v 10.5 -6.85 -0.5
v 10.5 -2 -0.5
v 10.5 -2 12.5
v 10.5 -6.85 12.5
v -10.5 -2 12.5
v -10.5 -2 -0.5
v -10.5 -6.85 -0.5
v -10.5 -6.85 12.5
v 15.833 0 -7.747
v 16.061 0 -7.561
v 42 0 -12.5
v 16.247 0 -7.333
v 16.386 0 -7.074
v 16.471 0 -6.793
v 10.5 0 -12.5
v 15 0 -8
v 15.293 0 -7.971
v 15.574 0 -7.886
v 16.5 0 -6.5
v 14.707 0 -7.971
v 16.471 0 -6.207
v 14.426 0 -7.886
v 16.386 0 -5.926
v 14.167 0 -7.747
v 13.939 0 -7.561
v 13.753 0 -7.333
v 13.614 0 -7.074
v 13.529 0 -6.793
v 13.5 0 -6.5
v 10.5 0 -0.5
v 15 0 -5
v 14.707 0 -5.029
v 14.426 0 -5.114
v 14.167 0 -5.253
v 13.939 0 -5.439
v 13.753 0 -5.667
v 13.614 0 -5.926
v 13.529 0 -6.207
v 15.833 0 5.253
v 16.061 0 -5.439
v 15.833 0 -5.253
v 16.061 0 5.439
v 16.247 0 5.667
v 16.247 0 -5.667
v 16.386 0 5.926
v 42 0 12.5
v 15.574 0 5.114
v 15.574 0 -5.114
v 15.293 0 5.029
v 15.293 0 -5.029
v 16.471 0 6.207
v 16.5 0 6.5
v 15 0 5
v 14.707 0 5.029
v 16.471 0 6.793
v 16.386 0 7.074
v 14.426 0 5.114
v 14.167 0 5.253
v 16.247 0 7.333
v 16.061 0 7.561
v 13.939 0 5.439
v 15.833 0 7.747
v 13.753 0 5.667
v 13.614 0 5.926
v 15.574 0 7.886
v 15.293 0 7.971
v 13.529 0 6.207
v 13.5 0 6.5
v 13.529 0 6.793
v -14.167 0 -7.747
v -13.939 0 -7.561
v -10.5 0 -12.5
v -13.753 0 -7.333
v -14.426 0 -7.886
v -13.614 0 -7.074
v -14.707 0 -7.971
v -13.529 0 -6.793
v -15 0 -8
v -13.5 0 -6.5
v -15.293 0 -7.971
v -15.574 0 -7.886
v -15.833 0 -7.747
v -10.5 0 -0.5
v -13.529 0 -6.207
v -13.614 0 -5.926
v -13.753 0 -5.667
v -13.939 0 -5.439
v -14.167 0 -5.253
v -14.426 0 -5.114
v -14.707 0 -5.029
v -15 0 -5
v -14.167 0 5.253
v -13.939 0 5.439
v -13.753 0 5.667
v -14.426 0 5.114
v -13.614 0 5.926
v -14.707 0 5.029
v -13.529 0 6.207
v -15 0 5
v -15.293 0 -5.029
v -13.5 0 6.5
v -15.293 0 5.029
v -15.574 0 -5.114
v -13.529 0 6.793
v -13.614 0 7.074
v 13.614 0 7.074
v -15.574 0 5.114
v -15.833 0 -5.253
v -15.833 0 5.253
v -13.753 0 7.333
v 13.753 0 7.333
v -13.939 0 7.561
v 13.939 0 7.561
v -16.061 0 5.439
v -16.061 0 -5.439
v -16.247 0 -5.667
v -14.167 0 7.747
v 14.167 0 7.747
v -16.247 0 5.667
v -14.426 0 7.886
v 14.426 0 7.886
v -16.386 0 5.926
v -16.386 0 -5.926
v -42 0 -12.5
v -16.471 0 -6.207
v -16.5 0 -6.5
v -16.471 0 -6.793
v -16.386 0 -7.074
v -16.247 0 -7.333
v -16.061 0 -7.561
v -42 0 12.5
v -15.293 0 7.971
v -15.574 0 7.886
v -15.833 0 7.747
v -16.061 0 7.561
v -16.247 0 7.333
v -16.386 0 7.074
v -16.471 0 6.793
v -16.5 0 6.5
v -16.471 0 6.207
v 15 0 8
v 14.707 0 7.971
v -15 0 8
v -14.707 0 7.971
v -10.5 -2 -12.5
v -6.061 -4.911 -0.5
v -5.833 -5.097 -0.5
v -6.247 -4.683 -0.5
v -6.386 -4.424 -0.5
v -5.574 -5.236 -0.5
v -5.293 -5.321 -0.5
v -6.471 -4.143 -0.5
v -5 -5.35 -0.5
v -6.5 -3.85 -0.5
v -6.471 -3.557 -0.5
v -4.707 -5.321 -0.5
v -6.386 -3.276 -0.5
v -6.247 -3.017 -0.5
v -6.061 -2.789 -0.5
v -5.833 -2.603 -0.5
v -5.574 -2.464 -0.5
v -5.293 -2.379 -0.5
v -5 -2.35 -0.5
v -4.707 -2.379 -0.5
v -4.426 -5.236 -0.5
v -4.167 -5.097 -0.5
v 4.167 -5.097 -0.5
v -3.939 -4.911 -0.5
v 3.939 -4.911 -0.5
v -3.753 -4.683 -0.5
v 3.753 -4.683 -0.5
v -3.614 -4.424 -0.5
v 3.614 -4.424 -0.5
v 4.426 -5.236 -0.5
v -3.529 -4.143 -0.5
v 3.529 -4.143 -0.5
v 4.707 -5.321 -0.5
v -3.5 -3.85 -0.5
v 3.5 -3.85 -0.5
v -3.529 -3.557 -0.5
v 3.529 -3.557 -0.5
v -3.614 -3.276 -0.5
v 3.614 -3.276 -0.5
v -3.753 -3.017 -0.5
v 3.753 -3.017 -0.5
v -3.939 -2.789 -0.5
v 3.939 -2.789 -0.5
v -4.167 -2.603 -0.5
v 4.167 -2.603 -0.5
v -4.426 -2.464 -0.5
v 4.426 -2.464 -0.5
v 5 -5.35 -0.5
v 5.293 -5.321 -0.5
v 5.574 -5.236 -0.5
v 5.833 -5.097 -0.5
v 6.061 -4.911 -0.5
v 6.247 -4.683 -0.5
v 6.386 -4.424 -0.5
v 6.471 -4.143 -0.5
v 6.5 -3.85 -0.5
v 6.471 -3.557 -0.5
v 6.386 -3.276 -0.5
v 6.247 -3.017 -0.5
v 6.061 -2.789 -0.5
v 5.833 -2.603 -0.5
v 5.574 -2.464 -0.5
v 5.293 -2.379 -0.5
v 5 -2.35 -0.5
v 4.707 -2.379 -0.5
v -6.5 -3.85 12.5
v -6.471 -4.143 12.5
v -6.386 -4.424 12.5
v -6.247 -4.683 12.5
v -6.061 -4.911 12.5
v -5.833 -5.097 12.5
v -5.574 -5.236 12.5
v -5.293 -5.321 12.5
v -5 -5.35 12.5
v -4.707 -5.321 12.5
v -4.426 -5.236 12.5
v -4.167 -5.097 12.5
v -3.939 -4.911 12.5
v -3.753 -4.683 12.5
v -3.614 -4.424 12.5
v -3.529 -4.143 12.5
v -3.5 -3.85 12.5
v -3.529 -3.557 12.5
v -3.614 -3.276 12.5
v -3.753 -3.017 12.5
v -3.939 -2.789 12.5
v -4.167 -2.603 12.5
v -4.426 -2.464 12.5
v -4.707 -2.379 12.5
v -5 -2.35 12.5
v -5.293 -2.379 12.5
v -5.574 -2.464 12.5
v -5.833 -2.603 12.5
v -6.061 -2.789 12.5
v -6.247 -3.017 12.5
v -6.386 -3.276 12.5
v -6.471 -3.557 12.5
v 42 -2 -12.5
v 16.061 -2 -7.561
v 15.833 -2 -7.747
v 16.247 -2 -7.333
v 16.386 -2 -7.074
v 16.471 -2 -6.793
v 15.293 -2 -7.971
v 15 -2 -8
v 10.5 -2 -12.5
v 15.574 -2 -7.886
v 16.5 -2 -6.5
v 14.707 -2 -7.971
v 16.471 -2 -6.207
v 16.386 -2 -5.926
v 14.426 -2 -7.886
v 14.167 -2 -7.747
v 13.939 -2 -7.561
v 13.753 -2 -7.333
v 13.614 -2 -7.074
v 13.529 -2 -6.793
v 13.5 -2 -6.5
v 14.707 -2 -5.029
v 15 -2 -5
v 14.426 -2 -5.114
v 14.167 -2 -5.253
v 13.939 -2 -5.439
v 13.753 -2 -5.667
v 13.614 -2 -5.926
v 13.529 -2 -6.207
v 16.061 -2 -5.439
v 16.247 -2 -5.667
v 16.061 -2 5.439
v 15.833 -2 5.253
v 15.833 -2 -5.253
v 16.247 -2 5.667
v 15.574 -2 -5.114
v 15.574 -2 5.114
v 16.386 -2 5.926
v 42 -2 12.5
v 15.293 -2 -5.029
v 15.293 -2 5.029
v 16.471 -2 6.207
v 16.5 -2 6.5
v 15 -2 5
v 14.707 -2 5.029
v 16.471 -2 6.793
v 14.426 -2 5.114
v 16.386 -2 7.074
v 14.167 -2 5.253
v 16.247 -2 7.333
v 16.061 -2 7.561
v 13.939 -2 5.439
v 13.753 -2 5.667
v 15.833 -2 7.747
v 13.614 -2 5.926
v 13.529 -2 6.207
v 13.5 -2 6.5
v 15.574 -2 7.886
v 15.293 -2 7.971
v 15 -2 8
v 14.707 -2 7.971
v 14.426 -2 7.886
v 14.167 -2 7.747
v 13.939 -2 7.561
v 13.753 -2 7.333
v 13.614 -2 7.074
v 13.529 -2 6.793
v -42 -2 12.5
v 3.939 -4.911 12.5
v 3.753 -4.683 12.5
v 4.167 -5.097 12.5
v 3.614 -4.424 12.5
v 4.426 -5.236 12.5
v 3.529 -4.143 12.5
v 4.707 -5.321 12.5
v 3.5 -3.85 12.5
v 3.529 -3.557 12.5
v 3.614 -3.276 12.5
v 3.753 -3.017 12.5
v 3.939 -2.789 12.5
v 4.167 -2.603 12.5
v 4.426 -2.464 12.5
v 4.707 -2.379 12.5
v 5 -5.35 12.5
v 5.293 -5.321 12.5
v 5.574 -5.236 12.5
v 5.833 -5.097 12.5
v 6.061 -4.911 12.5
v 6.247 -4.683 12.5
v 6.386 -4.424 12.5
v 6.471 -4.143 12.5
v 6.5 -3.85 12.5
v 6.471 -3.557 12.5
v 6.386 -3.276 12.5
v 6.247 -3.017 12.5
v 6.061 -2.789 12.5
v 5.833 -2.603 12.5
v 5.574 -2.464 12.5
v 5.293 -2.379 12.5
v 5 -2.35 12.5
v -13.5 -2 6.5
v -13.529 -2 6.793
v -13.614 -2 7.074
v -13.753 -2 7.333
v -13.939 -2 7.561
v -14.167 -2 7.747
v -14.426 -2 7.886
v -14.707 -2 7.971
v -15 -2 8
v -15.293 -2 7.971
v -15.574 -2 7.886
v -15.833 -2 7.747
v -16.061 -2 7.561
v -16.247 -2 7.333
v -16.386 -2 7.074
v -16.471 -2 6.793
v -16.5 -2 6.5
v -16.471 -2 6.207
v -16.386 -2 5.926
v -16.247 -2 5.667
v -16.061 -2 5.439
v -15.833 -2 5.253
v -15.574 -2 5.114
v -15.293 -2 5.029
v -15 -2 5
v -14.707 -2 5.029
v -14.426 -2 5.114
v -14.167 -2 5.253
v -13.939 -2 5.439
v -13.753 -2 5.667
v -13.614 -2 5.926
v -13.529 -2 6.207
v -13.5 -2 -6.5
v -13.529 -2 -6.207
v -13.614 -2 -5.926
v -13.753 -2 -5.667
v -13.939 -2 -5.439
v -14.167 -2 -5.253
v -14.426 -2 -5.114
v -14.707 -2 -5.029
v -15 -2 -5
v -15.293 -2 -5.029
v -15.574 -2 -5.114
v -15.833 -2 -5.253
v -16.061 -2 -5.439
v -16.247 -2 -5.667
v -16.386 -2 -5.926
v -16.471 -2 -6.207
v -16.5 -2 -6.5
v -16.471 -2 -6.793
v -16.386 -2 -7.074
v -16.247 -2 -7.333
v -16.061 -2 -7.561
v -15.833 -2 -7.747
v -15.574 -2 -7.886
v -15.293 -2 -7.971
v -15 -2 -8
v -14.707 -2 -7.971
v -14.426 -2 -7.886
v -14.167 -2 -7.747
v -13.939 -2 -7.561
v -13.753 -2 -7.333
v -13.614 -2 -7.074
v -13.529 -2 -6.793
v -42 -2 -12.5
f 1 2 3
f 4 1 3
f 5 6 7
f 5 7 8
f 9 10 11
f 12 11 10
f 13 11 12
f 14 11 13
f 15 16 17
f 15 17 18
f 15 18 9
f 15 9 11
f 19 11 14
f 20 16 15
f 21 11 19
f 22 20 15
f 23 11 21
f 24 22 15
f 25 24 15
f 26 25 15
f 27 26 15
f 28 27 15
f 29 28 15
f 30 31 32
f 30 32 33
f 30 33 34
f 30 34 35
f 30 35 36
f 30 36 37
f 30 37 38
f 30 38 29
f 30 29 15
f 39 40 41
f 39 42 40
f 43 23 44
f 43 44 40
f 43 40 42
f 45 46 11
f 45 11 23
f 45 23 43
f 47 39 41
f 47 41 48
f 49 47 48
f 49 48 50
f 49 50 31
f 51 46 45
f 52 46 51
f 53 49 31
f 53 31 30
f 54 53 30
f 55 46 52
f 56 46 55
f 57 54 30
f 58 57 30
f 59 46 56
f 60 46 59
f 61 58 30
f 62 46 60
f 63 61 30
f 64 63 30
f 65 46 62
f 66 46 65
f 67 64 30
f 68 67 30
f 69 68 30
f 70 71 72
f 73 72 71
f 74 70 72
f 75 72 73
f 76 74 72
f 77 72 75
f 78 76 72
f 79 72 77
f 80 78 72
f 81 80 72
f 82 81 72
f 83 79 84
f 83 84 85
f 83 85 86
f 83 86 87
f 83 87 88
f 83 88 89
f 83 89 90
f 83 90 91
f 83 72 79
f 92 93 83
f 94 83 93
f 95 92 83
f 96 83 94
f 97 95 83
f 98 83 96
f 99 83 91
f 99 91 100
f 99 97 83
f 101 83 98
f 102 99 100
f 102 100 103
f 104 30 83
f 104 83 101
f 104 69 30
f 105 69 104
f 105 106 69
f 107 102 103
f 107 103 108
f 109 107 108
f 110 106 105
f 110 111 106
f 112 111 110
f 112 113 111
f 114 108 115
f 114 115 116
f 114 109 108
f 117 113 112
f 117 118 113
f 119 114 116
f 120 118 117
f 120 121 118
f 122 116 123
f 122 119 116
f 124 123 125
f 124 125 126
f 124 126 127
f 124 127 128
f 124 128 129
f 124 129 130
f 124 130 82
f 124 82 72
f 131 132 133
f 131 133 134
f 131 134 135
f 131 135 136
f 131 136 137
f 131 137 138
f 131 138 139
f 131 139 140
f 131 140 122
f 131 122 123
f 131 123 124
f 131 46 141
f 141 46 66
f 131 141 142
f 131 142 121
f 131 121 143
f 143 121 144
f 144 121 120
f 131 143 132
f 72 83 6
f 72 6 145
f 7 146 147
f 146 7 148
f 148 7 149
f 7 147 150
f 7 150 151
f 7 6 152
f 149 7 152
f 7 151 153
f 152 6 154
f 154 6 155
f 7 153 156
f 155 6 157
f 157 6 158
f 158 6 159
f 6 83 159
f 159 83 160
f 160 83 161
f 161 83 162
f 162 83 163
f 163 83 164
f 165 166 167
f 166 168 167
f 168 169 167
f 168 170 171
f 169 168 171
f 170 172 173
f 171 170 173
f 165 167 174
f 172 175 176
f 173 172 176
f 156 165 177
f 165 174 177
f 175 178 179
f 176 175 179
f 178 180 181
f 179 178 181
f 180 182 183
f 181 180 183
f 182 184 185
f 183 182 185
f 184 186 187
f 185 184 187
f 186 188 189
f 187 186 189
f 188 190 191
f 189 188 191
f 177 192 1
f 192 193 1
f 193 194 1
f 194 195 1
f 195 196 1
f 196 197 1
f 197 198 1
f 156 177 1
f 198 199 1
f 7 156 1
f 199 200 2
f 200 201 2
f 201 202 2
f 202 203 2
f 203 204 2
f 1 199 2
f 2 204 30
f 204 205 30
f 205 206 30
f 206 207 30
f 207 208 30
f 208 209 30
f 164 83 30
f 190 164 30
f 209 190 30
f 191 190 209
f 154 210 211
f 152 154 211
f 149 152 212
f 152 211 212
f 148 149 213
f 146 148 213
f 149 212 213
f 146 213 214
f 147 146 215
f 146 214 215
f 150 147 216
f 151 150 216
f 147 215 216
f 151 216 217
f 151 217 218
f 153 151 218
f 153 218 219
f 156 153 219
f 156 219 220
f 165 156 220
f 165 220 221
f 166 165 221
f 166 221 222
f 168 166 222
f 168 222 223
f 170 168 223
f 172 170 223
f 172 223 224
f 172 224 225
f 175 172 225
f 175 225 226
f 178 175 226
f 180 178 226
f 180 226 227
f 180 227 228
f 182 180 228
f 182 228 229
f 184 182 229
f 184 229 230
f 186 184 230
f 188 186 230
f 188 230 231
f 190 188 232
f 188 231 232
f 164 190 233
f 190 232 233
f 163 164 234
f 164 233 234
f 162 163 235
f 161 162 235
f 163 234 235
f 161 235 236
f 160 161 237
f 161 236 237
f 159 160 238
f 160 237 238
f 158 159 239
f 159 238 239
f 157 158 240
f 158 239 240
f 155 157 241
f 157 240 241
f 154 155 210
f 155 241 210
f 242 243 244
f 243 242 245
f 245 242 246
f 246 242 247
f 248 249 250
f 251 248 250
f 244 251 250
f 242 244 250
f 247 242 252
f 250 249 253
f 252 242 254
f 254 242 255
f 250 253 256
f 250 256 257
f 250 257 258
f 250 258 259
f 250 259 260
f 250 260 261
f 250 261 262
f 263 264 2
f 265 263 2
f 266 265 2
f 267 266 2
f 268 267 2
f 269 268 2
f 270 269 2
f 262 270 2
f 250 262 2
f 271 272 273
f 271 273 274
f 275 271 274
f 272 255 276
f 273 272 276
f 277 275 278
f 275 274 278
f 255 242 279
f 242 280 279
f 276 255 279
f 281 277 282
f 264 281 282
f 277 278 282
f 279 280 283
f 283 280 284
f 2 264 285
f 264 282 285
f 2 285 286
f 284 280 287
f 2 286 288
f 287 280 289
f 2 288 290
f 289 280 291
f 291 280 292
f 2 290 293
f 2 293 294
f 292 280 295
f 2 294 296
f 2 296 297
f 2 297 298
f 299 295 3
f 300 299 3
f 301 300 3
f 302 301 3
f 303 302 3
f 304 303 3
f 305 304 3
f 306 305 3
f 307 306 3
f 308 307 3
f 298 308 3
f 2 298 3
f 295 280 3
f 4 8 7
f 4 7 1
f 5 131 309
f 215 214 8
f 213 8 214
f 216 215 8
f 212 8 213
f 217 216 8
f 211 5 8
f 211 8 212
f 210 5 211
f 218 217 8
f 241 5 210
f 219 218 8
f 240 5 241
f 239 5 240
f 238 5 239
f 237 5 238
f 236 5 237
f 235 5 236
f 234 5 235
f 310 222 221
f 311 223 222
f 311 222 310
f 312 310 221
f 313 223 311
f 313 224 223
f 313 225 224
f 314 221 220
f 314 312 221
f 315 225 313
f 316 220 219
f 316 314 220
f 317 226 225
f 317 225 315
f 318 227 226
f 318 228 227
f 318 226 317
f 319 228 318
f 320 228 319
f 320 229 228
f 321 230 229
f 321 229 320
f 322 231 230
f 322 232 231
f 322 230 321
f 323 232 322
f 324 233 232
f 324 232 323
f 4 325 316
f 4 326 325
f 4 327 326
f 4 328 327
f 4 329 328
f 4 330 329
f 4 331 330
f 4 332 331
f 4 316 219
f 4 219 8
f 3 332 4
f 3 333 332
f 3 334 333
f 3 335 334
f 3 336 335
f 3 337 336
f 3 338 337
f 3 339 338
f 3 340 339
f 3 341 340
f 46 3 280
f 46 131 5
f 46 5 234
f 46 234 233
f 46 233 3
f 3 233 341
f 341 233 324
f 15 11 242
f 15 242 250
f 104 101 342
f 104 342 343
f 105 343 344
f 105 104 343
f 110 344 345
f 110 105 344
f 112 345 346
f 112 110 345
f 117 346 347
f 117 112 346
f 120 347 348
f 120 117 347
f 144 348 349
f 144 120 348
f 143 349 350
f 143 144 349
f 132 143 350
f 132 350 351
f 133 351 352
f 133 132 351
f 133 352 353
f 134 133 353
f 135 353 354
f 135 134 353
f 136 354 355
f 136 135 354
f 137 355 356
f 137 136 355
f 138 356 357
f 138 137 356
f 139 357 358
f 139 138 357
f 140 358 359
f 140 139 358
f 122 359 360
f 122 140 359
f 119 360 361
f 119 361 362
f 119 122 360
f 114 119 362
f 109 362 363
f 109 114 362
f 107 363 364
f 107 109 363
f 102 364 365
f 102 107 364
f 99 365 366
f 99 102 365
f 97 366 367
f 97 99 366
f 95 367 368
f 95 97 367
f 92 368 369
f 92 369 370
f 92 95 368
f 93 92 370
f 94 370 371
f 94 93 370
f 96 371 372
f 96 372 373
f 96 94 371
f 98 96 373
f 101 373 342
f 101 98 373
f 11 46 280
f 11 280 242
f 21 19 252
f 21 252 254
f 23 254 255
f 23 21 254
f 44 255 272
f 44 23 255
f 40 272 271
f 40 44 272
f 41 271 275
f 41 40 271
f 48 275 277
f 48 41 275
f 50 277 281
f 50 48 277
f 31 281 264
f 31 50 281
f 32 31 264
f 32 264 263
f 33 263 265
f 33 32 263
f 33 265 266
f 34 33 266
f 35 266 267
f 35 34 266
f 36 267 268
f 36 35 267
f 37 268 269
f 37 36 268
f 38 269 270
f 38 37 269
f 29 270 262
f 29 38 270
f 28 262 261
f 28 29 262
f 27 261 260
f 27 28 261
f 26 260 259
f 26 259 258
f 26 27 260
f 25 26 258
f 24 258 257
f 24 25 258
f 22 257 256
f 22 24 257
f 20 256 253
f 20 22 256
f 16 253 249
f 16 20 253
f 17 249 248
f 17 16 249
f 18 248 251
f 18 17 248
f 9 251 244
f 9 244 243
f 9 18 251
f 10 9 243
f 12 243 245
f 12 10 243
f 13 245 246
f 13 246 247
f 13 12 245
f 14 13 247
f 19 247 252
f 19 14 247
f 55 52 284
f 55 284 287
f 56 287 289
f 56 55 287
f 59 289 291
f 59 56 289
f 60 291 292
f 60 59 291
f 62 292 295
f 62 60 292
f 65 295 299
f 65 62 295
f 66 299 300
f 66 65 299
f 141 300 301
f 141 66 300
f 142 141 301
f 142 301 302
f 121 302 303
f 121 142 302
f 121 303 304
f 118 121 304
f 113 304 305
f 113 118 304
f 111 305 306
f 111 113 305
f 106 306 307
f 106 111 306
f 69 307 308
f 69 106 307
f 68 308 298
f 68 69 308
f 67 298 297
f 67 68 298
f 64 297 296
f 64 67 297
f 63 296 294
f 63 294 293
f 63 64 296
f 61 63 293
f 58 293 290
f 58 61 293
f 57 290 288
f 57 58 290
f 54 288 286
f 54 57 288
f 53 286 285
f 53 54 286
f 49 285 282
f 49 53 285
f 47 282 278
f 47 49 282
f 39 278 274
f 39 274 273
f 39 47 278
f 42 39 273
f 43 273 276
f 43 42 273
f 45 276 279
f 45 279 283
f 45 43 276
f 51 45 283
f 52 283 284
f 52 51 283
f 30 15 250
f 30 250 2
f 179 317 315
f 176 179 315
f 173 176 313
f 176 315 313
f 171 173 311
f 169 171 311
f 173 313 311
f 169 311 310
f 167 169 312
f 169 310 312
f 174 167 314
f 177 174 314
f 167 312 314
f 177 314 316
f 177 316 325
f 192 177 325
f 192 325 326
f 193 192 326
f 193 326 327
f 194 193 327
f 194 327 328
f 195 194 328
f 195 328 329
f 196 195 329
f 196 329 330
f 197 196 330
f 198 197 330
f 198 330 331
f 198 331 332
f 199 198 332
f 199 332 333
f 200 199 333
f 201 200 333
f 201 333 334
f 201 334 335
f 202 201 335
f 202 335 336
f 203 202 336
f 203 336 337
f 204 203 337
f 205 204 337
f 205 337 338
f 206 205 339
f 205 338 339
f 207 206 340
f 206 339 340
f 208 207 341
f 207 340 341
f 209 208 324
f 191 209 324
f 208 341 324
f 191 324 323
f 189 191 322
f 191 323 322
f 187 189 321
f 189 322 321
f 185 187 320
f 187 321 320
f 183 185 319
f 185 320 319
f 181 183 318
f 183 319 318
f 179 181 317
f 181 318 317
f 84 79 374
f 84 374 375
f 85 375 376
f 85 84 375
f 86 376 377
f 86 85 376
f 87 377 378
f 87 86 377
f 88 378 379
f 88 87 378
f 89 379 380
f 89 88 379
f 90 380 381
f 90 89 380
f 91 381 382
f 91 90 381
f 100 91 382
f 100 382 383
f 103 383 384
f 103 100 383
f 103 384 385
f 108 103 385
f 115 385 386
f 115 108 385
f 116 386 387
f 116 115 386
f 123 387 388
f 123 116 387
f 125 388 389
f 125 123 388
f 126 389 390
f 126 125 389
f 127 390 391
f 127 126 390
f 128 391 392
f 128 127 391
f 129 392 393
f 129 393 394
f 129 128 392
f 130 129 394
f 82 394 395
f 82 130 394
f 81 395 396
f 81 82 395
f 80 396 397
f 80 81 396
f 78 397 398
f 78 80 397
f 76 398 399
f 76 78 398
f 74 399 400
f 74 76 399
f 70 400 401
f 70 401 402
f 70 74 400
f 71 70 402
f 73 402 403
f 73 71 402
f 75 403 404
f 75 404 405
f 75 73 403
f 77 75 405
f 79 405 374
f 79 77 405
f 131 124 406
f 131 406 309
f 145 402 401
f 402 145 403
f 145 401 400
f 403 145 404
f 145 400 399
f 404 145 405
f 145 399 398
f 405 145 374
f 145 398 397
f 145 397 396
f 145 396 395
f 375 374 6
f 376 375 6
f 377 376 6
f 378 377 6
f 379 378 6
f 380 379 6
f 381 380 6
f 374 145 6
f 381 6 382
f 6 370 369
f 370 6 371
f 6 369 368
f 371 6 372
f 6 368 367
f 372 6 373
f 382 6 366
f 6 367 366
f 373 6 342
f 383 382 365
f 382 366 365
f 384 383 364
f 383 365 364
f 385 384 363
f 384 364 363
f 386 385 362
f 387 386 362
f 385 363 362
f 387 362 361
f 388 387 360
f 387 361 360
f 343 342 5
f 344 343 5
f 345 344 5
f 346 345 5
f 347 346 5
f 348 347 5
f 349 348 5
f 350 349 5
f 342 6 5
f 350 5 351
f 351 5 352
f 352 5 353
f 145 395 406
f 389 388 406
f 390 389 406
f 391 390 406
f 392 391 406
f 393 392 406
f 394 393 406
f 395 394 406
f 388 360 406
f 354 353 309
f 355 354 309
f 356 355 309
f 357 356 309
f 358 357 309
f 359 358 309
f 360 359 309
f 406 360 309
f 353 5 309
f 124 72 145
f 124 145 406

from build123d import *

# Parameters (mm, degrees)
SKETCH_R     = 1.5
PAD_DEPTH    = 2
SKETCH001_W  = 21
SKETCH001_H  = 13
PAD001_DEPTH = 4.85
SKETCH002_R  = 1.5
POCKET_DEPTH = 21


with BuildPart() as part:
    # Sketch → Pad (new body)
    with BuildSketch(Plane.XZ):
        Polygon((-42, 12.5), (42, 12.5), (42, -12.5), (10.5, -12.5), (10.5, -0.5), (-10.5, -0.5), (-10.5, -12.5), (-42, -12.5), align=None)
        with Locations((-15, 6.5)):
            Circle(SKETCH_R, mode=Mode.SUBTRACT)
        with Locations((-15, -6.5)):
            Circle(SKETCH_R, mode=Mode.SUBTRACT)
        with Locations((15, -6.5)):
            Circle(SKETCH_R, mode=Mode.SUBTRACT)
        with Locations((15, 6.5)):
            Circle(SKETCH_R, mode=Mode.SUBTRACT)
    extrude(amount=PAD_DEPTH)

    # Sketch001 (on Face14 of Pad) → Pad001 (join)
    with BuildSketch(Plane.XZ.offset(2)):
        with Locations((0, 6)):
            Rectangle(SKETCH001_W, SKETCH001_H)
    extrude(amount=PAD001_DEPTH)

    # Sketch002 (on Face6 of Pad001) → Pocket (cut)
    with BuildSketch(Plane(origin=(0, 0, 12.5), x_dir=(-1, 0, 0), z_dir=(0, 0, 1))):
        with Locations((-5, 3.85)):
            Circle(SKETCH002_R)
        with Locations((5, 3.85)):
            Circle(SKETCH002_R)
    extrude(amount=-POCKET_DEPTH, mode=Mode.SUBTRACT)


solid = part.part
